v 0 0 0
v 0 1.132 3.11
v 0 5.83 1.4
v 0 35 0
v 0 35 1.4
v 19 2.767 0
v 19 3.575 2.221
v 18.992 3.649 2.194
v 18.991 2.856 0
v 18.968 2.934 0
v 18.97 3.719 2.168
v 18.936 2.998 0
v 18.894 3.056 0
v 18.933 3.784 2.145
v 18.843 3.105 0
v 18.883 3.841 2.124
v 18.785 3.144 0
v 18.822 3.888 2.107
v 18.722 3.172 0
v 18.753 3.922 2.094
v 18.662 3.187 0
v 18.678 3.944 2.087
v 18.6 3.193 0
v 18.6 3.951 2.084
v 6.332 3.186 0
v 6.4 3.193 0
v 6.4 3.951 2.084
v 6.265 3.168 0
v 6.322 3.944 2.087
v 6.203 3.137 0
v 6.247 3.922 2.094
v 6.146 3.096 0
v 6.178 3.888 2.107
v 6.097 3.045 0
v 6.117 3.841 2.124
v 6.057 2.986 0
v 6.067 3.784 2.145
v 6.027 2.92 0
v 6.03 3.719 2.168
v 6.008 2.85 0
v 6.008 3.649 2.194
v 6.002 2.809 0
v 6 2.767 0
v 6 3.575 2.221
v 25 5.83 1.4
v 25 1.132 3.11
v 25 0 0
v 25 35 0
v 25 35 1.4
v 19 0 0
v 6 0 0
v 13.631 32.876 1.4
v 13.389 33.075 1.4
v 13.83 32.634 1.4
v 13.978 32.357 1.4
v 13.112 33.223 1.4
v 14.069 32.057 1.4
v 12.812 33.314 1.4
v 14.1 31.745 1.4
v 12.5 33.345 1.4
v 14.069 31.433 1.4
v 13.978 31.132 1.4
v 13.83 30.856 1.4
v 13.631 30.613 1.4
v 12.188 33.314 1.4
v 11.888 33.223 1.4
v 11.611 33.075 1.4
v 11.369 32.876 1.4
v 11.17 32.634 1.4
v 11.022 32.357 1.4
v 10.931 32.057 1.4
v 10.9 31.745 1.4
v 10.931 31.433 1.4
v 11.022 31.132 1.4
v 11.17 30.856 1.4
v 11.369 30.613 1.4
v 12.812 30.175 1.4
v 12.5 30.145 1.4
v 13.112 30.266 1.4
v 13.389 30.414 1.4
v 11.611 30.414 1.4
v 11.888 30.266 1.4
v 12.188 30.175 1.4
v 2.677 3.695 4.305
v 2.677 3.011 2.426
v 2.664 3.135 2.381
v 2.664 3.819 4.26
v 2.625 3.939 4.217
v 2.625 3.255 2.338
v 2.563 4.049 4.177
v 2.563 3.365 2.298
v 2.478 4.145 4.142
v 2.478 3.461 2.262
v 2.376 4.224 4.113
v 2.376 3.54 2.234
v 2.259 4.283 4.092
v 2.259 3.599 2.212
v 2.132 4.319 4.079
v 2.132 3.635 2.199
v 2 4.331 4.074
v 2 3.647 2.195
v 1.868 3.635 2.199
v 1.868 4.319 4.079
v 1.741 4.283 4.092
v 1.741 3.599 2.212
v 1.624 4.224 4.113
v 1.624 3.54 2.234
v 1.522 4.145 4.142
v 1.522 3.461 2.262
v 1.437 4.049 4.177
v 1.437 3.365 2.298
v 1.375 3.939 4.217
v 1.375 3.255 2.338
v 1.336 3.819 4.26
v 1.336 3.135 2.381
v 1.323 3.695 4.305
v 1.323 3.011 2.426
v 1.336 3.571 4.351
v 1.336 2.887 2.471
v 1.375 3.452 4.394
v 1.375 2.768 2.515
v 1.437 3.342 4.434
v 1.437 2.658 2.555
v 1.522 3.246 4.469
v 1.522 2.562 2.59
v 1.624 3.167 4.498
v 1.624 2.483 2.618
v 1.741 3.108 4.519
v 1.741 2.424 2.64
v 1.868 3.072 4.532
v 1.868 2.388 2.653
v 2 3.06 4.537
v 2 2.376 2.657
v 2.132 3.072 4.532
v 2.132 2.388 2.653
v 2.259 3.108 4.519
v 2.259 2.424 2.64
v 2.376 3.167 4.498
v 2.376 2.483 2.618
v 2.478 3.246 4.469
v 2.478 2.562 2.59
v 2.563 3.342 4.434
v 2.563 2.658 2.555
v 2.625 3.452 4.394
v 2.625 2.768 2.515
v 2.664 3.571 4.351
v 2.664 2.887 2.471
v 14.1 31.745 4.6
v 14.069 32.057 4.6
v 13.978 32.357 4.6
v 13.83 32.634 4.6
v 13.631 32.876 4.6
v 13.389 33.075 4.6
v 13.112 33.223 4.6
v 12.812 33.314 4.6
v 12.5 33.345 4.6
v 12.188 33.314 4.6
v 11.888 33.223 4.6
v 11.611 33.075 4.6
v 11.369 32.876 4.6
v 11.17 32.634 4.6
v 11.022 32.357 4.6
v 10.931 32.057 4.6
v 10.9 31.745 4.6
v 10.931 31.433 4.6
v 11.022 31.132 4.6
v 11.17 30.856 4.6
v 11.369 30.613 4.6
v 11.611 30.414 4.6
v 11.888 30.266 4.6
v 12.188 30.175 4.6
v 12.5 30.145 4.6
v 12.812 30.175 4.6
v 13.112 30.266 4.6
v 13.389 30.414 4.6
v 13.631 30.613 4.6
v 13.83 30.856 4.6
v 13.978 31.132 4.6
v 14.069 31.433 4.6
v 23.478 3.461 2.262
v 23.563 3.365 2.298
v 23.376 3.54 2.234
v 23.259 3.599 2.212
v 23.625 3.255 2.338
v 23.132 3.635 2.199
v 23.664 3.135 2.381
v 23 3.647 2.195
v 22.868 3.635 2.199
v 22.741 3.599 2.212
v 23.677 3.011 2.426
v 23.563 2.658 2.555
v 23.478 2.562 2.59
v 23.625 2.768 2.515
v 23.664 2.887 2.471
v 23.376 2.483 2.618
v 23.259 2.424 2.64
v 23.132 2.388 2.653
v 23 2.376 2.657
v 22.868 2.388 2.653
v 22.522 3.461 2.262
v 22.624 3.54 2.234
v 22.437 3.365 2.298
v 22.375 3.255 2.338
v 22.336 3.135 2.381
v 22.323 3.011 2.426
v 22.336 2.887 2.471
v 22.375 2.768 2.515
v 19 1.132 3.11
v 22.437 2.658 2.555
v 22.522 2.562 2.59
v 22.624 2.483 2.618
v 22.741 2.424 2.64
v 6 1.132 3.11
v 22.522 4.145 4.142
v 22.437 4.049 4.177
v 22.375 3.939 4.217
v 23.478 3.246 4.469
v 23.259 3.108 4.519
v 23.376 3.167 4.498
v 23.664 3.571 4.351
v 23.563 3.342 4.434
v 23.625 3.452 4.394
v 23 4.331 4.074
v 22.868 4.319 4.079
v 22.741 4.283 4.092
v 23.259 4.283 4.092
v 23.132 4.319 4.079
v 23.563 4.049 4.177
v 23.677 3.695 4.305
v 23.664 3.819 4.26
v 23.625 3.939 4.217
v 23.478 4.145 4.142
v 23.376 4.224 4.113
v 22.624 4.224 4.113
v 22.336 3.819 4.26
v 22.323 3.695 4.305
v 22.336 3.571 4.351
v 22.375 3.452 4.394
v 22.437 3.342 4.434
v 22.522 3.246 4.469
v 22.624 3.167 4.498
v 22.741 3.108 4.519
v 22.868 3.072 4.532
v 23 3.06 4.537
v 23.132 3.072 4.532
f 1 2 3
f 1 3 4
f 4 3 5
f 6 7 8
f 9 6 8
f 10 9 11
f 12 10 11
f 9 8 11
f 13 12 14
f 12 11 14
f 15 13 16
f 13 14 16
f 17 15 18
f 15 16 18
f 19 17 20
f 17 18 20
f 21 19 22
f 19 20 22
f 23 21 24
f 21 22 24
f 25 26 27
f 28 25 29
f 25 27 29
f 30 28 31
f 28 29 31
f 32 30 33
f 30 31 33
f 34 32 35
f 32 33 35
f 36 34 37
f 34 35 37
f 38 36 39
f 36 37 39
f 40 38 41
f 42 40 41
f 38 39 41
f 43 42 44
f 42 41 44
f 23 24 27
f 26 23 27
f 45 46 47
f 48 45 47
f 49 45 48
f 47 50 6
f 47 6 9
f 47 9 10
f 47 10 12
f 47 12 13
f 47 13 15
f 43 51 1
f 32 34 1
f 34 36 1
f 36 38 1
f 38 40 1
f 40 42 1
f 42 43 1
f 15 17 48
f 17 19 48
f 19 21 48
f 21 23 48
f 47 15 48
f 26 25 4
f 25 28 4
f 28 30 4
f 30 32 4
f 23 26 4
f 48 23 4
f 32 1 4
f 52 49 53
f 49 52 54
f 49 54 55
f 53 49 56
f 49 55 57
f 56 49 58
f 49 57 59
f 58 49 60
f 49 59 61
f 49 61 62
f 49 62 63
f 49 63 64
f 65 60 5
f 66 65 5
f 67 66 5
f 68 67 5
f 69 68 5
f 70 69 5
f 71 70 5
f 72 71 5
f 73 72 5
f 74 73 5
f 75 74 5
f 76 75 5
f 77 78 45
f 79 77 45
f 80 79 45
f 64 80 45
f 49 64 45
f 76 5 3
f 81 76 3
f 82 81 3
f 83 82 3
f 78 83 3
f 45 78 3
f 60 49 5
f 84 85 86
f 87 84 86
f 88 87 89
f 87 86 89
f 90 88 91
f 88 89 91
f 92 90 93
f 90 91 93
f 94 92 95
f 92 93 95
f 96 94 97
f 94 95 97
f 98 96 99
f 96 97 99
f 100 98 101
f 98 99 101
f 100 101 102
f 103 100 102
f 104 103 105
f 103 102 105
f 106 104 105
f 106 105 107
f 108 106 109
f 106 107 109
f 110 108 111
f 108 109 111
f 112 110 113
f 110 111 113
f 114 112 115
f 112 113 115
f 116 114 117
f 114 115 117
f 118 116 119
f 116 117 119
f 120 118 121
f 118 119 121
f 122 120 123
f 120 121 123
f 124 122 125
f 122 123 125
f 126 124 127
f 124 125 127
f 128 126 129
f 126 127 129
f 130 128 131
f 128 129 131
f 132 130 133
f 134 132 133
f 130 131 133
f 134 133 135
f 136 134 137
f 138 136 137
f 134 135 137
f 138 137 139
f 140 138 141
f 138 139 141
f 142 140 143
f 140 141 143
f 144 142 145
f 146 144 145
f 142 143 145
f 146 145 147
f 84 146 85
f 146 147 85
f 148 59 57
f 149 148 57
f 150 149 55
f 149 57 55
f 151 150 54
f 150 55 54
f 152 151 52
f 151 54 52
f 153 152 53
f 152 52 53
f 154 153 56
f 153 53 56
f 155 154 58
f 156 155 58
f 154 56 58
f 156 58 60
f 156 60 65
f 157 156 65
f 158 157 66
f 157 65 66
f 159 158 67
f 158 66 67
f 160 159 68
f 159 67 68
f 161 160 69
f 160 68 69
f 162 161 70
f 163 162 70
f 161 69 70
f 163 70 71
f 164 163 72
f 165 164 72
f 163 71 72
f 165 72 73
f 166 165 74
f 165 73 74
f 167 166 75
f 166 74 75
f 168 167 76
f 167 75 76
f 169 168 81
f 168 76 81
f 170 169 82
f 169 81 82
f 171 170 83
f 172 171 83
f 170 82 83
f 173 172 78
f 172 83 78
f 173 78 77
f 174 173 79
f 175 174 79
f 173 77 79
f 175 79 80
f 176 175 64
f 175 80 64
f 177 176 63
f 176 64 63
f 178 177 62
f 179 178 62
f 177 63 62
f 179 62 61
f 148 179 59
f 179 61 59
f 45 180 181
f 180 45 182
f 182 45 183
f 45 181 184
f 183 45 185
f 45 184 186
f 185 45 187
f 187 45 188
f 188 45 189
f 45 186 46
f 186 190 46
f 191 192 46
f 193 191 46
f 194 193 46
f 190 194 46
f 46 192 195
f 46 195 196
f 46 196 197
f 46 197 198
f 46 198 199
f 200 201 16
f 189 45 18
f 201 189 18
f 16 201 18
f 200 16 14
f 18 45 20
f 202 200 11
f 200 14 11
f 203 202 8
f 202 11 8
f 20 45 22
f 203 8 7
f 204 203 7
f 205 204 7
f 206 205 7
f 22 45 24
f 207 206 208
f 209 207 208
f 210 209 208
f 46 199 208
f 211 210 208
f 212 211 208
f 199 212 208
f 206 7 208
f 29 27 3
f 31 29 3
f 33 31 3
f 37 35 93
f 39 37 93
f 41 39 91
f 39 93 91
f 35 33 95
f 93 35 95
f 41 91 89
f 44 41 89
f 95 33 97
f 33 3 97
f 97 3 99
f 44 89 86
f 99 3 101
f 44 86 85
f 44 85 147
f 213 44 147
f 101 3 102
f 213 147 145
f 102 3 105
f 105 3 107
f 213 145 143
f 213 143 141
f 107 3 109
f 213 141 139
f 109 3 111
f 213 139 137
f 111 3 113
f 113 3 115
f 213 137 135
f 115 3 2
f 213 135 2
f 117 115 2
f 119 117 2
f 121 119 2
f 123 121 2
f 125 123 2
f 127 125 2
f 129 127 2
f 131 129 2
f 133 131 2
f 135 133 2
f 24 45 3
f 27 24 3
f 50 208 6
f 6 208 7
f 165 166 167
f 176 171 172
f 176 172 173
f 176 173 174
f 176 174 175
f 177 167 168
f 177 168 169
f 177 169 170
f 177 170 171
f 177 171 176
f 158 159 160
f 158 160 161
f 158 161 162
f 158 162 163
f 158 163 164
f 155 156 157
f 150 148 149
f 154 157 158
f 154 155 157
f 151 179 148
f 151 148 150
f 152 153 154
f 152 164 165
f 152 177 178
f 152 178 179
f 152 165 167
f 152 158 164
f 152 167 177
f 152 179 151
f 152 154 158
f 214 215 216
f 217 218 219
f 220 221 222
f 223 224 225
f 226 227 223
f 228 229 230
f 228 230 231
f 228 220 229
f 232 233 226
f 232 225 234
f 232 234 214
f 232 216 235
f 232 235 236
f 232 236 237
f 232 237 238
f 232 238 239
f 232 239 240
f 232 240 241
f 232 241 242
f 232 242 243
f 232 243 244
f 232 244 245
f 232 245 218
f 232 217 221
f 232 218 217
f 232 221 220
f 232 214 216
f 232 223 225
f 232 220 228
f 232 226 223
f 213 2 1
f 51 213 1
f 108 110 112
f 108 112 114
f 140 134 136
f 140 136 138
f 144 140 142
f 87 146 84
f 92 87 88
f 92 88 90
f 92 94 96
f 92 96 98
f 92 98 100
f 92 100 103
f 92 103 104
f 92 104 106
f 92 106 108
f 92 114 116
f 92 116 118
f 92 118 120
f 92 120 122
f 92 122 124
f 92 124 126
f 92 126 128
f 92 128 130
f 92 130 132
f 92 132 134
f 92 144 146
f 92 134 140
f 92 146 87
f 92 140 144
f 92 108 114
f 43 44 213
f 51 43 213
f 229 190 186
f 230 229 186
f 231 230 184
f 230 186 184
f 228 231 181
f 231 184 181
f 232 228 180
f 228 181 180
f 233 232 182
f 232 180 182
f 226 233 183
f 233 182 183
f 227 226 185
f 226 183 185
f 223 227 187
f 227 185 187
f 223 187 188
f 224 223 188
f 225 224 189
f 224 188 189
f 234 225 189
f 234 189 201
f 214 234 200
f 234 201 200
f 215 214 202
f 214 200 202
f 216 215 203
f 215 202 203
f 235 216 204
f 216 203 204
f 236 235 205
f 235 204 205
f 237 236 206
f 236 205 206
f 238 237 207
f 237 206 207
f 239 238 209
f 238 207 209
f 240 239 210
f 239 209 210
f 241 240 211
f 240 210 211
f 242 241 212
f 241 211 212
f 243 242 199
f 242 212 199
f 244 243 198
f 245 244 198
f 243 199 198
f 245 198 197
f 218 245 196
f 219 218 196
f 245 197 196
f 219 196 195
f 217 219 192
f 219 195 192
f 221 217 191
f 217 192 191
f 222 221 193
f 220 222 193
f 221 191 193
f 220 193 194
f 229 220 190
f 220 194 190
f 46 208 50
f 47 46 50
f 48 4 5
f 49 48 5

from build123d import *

# Parameters (mm, degrees)
F2_DEPTH = 25
F4_DEPTH = 3.3107000528
F5_R     = 0.6765328669
F6_DEPTH = 2
F7_R     = 1.6
F8_DEPTH = 3.2


with BuildPart() as f2:
    # F1 (on Right) → F2 (new body)
    with BuildSketch(Plane.YZ):
        Polygon((0, 0), (35, 0), (35, 1.4), (5.8304471904, 1.4), (1.1319840864, 3.1101007166), align=None)
    extrude(amount=F2_DEPTH)

    # F3 (on face) → F4 (cut, through all)
    with BuildSketch(Plane(origin=(0, 1.1319840864, 3.1101007166), x_dir=(1, 0, 0), z_dir=(0, 0.3420201433, 0.9396926208))):
        with BuildLine():
            Line((6, 0), (19, 0))
            Line((19, 0), (19, 2.6))
            ThreePointArc((19, 2.6), (18.8828427125, 2.8828427125), (18.6, 3))
            Line((18.6, 3), (6.4, 3))
            ThreePointArc((6.4, 3), (6.1171572875, 2.8828427125), (6, 2.6))
            Line((6, 2.6), (6, 0))
        make_face()
    extrude(amount=-F4_DEPTH, mode=Mode.SUBTRACT)

    # F5 (on face) → F6 (join)
    with BuildSketch(Plane(origin=(0, 1.1319840864, 3.1101007166), x_dir=(1, 0, 0), z_dir=(0, 0.3420201433, 0.9396926208))):
        with Locations((23, 2)):
            Circle(F5_R)
        with Locations((2, 2)):
            Circle(F5_R)
    extrude(amount=F6_DEPTH)

    # F7 (on face) → F8 (join)
    with BuildSketch(Plane.XY.offset(1.4)):
        with Locations((12.5, 31.7446738482)):
            Circle(F7_R)
    extrude(amount=F8_DEPTH)


solid = f2.part
